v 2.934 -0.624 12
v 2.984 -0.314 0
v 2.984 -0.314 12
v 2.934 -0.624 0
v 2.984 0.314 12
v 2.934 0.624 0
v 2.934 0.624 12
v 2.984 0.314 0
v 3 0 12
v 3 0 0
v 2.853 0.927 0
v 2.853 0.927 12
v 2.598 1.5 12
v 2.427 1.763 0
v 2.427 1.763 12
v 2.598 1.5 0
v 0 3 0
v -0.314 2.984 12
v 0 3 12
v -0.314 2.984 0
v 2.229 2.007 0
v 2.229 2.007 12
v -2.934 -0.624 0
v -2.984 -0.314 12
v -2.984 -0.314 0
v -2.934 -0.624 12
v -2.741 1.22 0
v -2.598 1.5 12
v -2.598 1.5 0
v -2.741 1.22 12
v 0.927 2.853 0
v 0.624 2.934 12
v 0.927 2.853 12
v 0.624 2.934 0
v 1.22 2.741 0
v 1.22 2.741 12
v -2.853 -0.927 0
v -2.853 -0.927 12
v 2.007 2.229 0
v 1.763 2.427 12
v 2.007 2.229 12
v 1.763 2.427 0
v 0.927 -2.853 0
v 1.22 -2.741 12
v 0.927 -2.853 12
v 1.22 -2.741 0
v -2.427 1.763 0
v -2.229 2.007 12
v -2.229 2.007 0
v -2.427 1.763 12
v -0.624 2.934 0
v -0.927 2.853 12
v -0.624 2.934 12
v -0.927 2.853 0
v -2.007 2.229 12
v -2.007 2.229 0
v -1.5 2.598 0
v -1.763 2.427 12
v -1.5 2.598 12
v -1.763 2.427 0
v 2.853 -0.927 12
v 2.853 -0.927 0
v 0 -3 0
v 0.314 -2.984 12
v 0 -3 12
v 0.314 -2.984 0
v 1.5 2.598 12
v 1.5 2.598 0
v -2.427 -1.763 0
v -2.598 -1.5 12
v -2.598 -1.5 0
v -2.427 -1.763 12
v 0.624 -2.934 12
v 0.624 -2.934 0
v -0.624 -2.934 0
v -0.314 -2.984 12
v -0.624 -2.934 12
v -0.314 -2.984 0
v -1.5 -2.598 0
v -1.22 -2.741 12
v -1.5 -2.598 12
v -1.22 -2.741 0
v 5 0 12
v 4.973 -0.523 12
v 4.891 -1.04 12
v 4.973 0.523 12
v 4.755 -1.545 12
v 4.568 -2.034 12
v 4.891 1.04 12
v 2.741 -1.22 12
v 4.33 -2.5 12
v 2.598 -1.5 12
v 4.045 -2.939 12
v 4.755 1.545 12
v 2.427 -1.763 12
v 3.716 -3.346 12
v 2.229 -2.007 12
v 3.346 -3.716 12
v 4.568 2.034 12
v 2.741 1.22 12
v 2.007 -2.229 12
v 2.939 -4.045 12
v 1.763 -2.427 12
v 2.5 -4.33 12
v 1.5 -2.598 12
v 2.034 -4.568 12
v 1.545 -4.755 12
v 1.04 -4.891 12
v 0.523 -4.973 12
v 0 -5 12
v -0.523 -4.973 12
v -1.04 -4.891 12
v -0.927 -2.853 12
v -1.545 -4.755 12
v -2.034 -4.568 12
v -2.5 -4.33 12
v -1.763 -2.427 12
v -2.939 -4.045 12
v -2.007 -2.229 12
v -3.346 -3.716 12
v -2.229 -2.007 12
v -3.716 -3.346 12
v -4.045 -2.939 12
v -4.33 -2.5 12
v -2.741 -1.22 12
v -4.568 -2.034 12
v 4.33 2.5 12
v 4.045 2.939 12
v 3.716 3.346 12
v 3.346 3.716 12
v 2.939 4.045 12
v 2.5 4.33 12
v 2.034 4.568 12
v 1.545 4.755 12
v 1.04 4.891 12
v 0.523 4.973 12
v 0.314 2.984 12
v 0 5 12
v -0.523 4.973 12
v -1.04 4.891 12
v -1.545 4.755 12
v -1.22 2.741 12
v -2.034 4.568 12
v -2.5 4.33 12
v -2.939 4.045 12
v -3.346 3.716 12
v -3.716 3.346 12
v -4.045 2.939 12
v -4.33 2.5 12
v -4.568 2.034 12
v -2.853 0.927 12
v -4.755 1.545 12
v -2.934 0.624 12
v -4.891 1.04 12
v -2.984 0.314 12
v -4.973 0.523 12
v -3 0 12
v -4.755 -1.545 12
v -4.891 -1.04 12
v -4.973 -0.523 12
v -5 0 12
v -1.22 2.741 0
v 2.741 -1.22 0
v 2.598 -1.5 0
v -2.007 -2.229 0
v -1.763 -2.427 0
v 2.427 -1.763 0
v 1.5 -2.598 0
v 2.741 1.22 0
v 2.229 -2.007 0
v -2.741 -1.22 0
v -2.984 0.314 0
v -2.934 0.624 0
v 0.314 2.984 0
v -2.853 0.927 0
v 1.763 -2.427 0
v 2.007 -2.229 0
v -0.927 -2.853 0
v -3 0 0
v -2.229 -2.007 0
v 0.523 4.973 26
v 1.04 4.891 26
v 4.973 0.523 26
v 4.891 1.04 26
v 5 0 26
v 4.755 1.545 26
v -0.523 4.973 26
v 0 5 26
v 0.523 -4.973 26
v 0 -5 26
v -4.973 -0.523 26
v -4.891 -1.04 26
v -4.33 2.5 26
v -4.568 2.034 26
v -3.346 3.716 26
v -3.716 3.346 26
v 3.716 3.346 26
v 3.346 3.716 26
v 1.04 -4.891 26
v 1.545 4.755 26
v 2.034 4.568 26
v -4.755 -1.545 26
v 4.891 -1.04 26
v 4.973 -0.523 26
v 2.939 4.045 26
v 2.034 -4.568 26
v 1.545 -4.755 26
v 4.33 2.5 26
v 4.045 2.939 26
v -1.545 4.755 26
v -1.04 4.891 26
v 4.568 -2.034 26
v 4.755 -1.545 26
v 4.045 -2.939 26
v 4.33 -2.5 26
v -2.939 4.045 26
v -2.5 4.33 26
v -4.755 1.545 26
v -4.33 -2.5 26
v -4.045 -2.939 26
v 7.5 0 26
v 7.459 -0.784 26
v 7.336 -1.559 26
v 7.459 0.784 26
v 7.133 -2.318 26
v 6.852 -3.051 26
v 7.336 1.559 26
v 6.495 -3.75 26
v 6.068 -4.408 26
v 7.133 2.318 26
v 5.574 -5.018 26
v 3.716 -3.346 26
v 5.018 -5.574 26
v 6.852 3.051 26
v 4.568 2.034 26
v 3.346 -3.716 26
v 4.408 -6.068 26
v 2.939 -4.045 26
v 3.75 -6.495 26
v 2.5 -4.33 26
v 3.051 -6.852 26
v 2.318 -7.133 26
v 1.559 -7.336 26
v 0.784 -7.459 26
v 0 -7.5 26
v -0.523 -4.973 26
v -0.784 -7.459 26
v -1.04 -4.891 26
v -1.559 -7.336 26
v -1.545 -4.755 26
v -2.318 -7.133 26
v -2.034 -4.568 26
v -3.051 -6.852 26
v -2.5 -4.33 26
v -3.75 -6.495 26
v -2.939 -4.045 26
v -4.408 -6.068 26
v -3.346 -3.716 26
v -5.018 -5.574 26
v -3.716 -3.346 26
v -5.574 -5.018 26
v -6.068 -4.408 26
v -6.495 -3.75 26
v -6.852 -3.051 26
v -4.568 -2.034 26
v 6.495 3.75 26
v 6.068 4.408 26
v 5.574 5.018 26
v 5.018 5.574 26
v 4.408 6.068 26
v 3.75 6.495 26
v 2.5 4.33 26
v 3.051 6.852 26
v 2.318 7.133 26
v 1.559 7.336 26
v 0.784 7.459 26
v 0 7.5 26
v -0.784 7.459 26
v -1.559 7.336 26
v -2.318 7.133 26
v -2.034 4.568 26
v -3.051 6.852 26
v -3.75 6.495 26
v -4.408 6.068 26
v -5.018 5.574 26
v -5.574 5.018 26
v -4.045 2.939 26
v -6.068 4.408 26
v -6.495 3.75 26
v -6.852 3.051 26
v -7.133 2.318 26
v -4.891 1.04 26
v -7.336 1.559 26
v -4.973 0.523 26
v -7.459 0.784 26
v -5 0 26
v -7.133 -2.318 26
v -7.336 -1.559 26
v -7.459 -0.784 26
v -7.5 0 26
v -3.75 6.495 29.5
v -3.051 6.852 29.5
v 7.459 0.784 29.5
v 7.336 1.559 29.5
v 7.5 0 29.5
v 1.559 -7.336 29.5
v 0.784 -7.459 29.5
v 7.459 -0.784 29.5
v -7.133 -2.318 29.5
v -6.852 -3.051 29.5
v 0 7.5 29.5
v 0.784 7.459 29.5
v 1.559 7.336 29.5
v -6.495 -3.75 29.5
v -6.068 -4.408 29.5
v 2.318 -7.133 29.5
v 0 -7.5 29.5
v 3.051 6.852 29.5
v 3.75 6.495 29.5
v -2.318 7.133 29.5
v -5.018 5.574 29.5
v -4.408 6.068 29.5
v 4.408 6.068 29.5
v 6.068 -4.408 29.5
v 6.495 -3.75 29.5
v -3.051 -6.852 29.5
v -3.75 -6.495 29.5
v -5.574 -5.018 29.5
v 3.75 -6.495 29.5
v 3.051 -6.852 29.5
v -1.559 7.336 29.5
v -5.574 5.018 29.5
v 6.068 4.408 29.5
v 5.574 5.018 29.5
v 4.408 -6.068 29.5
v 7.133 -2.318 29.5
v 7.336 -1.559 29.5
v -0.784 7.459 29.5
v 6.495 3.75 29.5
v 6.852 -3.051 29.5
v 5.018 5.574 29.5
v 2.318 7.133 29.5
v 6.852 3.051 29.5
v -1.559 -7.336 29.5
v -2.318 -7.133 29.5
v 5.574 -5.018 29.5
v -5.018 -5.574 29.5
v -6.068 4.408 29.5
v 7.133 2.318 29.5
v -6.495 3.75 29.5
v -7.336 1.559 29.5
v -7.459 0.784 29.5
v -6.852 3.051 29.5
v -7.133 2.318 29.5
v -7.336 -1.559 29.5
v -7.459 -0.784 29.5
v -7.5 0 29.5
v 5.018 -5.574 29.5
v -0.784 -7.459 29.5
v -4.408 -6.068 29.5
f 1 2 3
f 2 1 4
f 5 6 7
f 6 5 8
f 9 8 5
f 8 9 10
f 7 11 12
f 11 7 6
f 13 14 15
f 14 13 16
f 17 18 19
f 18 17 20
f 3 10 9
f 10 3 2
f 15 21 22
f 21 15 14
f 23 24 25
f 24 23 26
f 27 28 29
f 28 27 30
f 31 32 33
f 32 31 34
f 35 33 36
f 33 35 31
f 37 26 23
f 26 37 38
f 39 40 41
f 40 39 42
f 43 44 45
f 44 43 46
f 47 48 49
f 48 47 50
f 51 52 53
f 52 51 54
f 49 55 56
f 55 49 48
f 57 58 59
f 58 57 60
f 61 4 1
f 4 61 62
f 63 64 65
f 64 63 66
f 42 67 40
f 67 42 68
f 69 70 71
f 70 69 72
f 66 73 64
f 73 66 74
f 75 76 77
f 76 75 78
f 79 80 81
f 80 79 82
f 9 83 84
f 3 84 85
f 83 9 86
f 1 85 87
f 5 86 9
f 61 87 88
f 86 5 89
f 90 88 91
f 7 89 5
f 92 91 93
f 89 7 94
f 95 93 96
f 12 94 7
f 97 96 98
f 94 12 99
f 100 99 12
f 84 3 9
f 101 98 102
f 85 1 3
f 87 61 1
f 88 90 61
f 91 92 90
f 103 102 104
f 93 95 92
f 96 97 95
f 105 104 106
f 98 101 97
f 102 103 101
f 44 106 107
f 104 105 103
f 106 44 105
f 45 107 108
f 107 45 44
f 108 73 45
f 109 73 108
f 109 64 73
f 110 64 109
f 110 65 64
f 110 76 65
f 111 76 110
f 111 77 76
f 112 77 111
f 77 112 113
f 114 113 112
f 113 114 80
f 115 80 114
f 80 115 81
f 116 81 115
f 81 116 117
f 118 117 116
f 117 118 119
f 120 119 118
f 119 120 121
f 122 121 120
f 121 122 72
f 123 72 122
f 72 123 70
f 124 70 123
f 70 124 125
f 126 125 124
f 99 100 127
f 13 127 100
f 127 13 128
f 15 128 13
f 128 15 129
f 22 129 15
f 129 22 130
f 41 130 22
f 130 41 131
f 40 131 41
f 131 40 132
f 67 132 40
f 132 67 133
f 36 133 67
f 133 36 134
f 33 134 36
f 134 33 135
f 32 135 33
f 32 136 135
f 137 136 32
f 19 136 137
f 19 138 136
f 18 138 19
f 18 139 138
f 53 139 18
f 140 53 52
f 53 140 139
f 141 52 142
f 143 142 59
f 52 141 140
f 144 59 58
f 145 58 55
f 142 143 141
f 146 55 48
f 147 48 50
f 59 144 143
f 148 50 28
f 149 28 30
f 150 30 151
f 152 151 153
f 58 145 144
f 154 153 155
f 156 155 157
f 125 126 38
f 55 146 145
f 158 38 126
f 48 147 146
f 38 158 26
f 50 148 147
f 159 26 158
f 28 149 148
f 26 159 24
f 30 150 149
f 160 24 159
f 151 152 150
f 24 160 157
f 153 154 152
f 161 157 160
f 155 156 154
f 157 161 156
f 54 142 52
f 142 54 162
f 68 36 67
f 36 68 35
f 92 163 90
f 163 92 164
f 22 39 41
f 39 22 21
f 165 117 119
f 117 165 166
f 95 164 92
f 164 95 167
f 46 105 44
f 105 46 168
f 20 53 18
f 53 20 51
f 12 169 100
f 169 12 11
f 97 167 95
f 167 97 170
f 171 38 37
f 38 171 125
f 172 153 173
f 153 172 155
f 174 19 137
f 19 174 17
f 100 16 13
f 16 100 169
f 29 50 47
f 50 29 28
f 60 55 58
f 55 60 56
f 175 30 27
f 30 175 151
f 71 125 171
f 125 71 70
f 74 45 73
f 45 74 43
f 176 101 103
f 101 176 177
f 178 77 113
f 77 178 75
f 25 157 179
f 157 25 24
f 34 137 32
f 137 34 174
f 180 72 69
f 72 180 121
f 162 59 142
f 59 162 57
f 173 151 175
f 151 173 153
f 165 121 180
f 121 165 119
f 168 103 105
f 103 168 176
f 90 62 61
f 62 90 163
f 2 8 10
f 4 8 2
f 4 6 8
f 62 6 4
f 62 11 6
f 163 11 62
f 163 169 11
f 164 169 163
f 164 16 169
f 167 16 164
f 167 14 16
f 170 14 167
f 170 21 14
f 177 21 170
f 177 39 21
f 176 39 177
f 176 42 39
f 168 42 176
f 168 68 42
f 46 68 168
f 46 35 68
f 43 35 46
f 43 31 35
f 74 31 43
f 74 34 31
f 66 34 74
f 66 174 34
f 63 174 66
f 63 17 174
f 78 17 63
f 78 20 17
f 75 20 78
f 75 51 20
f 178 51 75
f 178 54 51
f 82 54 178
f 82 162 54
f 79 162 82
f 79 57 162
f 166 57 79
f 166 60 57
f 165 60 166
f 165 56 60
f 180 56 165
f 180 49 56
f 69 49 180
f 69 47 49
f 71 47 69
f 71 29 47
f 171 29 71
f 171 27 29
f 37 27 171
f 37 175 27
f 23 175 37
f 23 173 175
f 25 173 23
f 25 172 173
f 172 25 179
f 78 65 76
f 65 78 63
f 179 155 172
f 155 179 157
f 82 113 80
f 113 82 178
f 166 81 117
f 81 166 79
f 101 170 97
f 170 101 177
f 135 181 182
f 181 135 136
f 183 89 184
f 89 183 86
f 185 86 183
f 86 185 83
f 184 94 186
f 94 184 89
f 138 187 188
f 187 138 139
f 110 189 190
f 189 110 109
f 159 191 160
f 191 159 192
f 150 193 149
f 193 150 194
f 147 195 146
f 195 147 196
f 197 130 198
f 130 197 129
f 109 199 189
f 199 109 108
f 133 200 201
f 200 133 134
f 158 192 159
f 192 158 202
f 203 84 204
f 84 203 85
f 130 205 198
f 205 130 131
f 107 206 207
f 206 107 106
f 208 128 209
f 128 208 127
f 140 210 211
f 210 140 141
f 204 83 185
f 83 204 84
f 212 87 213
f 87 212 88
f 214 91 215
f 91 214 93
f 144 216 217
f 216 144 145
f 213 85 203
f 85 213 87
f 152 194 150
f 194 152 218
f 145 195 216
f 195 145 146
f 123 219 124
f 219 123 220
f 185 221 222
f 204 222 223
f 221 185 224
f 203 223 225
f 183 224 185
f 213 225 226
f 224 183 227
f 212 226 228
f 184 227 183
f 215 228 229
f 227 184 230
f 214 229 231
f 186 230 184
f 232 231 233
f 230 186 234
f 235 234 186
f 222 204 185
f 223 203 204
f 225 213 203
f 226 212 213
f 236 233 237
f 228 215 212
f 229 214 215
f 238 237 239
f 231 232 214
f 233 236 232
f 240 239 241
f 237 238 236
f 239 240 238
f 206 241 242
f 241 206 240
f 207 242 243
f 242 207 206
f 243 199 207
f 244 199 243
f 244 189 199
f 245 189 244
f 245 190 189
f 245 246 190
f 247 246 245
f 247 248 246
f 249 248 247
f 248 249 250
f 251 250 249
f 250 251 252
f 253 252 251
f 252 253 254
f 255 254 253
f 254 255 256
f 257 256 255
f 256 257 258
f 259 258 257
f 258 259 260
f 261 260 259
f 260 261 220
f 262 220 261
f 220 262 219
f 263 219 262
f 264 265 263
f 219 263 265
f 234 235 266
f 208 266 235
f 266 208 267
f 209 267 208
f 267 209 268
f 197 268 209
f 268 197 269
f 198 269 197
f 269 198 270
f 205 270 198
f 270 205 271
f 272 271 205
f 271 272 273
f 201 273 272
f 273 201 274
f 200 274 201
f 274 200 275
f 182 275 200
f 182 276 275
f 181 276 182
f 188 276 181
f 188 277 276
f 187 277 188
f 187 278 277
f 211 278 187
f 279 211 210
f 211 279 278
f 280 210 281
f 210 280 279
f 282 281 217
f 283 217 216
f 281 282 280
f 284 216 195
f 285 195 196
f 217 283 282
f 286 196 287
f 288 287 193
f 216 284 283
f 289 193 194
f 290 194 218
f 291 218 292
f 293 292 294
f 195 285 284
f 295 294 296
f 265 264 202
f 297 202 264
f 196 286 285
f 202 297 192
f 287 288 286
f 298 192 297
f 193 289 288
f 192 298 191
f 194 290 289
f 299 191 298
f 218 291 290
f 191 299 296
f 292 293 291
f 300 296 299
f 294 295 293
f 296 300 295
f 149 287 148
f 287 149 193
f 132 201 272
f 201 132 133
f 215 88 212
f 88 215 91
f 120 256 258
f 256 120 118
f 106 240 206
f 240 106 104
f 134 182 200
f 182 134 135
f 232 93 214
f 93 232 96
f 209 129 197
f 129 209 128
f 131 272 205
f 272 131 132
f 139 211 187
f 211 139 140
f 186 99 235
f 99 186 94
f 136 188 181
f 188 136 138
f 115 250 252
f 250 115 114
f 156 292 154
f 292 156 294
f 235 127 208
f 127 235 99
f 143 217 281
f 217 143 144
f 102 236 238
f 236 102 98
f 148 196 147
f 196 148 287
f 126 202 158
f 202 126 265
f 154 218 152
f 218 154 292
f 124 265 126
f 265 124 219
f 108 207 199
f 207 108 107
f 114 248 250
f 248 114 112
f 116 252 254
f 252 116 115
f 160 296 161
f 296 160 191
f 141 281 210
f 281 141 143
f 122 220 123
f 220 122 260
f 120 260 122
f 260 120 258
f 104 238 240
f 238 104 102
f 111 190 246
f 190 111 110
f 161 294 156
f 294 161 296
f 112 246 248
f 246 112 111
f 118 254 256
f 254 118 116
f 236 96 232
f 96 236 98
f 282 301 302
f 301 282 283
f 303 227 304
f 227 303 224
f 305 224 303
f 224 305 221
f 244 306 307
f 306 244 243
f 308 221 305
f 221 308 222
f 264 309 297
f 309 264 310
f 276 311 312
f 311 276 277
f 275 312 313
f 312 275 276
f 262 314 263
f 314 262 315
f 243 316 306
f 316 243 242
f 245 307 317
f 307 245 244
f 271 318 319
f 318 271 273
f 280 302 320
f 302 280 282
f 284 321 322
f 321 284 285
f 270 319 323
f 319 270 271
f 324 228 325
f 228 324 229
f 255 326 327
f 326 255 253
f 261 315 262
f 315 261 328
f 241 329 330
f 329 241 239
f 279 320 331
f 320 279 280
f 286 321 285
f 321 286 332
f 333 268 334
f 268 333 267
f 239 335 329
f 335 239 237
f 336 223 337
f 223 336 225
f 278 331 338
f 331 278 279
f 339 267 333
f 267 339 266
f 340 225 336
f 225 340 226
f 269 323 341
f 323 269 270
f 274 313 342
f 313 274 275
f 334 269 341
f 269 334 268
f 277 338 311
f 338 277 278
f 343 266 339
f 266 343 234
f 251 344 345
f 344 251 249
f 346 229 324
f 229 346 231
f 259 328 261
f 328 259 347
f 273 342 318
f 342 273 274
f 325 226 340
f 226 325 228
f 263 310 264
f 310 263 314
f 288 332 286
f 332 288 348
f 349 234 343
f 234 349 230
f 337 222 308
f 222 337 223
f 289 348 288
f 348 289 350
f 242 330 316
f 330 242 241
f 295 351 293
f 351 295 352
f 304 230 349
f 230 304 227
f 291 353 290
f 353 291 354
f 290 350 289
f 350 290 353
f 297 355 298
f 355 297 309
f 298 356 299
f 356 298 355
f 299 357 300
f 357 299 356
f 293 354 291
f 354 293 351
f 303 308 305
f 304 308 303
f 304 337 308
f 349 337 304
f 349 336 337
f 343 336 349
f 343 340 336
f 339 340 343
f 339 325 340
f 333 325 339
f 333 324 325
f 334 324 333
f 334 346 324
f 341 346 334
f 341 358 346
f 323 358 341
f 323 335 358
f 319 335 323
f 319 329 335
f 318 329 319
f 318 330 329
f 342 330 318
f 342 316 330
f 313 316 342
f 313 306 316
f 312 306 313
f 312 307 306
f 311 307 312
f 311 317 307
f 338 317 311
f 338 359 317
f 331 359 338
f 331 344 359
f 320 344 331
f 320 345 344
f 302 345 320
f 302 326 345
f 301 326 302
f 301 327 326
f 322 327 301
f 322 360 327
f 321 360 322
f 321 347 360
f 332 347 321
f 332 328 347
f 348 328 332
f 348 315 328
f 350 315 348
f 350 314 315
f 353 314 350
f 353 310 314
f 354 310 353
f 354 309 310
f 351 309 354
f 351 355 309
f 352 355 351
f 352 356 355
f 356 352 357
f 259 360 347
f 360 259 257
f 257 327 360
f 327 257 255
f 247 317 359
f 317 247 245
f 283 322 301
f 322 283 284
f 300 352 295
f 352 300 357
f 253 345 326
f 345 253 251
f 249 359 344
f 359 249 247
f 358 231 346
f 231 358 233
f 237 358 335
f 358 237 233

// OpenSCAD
// Shoulder bolt.
$fn = 60;
eps = 0.02;
thread_d = 6;
shoulder_d = 10;
shoulder_l = 14;
thread_l = 12;
head_d = shoulder_d + 5;
union() {
    cylinder(d=thread_d,h=thread_l);
    translate([0,0,thread_l]) cylinder(d=shoulder_d,h=shoulder_l);
    translate([0,0,thread_l+shoulder_l]) cylinder(d=head_d,h=shoulder_d*0.35);
}
